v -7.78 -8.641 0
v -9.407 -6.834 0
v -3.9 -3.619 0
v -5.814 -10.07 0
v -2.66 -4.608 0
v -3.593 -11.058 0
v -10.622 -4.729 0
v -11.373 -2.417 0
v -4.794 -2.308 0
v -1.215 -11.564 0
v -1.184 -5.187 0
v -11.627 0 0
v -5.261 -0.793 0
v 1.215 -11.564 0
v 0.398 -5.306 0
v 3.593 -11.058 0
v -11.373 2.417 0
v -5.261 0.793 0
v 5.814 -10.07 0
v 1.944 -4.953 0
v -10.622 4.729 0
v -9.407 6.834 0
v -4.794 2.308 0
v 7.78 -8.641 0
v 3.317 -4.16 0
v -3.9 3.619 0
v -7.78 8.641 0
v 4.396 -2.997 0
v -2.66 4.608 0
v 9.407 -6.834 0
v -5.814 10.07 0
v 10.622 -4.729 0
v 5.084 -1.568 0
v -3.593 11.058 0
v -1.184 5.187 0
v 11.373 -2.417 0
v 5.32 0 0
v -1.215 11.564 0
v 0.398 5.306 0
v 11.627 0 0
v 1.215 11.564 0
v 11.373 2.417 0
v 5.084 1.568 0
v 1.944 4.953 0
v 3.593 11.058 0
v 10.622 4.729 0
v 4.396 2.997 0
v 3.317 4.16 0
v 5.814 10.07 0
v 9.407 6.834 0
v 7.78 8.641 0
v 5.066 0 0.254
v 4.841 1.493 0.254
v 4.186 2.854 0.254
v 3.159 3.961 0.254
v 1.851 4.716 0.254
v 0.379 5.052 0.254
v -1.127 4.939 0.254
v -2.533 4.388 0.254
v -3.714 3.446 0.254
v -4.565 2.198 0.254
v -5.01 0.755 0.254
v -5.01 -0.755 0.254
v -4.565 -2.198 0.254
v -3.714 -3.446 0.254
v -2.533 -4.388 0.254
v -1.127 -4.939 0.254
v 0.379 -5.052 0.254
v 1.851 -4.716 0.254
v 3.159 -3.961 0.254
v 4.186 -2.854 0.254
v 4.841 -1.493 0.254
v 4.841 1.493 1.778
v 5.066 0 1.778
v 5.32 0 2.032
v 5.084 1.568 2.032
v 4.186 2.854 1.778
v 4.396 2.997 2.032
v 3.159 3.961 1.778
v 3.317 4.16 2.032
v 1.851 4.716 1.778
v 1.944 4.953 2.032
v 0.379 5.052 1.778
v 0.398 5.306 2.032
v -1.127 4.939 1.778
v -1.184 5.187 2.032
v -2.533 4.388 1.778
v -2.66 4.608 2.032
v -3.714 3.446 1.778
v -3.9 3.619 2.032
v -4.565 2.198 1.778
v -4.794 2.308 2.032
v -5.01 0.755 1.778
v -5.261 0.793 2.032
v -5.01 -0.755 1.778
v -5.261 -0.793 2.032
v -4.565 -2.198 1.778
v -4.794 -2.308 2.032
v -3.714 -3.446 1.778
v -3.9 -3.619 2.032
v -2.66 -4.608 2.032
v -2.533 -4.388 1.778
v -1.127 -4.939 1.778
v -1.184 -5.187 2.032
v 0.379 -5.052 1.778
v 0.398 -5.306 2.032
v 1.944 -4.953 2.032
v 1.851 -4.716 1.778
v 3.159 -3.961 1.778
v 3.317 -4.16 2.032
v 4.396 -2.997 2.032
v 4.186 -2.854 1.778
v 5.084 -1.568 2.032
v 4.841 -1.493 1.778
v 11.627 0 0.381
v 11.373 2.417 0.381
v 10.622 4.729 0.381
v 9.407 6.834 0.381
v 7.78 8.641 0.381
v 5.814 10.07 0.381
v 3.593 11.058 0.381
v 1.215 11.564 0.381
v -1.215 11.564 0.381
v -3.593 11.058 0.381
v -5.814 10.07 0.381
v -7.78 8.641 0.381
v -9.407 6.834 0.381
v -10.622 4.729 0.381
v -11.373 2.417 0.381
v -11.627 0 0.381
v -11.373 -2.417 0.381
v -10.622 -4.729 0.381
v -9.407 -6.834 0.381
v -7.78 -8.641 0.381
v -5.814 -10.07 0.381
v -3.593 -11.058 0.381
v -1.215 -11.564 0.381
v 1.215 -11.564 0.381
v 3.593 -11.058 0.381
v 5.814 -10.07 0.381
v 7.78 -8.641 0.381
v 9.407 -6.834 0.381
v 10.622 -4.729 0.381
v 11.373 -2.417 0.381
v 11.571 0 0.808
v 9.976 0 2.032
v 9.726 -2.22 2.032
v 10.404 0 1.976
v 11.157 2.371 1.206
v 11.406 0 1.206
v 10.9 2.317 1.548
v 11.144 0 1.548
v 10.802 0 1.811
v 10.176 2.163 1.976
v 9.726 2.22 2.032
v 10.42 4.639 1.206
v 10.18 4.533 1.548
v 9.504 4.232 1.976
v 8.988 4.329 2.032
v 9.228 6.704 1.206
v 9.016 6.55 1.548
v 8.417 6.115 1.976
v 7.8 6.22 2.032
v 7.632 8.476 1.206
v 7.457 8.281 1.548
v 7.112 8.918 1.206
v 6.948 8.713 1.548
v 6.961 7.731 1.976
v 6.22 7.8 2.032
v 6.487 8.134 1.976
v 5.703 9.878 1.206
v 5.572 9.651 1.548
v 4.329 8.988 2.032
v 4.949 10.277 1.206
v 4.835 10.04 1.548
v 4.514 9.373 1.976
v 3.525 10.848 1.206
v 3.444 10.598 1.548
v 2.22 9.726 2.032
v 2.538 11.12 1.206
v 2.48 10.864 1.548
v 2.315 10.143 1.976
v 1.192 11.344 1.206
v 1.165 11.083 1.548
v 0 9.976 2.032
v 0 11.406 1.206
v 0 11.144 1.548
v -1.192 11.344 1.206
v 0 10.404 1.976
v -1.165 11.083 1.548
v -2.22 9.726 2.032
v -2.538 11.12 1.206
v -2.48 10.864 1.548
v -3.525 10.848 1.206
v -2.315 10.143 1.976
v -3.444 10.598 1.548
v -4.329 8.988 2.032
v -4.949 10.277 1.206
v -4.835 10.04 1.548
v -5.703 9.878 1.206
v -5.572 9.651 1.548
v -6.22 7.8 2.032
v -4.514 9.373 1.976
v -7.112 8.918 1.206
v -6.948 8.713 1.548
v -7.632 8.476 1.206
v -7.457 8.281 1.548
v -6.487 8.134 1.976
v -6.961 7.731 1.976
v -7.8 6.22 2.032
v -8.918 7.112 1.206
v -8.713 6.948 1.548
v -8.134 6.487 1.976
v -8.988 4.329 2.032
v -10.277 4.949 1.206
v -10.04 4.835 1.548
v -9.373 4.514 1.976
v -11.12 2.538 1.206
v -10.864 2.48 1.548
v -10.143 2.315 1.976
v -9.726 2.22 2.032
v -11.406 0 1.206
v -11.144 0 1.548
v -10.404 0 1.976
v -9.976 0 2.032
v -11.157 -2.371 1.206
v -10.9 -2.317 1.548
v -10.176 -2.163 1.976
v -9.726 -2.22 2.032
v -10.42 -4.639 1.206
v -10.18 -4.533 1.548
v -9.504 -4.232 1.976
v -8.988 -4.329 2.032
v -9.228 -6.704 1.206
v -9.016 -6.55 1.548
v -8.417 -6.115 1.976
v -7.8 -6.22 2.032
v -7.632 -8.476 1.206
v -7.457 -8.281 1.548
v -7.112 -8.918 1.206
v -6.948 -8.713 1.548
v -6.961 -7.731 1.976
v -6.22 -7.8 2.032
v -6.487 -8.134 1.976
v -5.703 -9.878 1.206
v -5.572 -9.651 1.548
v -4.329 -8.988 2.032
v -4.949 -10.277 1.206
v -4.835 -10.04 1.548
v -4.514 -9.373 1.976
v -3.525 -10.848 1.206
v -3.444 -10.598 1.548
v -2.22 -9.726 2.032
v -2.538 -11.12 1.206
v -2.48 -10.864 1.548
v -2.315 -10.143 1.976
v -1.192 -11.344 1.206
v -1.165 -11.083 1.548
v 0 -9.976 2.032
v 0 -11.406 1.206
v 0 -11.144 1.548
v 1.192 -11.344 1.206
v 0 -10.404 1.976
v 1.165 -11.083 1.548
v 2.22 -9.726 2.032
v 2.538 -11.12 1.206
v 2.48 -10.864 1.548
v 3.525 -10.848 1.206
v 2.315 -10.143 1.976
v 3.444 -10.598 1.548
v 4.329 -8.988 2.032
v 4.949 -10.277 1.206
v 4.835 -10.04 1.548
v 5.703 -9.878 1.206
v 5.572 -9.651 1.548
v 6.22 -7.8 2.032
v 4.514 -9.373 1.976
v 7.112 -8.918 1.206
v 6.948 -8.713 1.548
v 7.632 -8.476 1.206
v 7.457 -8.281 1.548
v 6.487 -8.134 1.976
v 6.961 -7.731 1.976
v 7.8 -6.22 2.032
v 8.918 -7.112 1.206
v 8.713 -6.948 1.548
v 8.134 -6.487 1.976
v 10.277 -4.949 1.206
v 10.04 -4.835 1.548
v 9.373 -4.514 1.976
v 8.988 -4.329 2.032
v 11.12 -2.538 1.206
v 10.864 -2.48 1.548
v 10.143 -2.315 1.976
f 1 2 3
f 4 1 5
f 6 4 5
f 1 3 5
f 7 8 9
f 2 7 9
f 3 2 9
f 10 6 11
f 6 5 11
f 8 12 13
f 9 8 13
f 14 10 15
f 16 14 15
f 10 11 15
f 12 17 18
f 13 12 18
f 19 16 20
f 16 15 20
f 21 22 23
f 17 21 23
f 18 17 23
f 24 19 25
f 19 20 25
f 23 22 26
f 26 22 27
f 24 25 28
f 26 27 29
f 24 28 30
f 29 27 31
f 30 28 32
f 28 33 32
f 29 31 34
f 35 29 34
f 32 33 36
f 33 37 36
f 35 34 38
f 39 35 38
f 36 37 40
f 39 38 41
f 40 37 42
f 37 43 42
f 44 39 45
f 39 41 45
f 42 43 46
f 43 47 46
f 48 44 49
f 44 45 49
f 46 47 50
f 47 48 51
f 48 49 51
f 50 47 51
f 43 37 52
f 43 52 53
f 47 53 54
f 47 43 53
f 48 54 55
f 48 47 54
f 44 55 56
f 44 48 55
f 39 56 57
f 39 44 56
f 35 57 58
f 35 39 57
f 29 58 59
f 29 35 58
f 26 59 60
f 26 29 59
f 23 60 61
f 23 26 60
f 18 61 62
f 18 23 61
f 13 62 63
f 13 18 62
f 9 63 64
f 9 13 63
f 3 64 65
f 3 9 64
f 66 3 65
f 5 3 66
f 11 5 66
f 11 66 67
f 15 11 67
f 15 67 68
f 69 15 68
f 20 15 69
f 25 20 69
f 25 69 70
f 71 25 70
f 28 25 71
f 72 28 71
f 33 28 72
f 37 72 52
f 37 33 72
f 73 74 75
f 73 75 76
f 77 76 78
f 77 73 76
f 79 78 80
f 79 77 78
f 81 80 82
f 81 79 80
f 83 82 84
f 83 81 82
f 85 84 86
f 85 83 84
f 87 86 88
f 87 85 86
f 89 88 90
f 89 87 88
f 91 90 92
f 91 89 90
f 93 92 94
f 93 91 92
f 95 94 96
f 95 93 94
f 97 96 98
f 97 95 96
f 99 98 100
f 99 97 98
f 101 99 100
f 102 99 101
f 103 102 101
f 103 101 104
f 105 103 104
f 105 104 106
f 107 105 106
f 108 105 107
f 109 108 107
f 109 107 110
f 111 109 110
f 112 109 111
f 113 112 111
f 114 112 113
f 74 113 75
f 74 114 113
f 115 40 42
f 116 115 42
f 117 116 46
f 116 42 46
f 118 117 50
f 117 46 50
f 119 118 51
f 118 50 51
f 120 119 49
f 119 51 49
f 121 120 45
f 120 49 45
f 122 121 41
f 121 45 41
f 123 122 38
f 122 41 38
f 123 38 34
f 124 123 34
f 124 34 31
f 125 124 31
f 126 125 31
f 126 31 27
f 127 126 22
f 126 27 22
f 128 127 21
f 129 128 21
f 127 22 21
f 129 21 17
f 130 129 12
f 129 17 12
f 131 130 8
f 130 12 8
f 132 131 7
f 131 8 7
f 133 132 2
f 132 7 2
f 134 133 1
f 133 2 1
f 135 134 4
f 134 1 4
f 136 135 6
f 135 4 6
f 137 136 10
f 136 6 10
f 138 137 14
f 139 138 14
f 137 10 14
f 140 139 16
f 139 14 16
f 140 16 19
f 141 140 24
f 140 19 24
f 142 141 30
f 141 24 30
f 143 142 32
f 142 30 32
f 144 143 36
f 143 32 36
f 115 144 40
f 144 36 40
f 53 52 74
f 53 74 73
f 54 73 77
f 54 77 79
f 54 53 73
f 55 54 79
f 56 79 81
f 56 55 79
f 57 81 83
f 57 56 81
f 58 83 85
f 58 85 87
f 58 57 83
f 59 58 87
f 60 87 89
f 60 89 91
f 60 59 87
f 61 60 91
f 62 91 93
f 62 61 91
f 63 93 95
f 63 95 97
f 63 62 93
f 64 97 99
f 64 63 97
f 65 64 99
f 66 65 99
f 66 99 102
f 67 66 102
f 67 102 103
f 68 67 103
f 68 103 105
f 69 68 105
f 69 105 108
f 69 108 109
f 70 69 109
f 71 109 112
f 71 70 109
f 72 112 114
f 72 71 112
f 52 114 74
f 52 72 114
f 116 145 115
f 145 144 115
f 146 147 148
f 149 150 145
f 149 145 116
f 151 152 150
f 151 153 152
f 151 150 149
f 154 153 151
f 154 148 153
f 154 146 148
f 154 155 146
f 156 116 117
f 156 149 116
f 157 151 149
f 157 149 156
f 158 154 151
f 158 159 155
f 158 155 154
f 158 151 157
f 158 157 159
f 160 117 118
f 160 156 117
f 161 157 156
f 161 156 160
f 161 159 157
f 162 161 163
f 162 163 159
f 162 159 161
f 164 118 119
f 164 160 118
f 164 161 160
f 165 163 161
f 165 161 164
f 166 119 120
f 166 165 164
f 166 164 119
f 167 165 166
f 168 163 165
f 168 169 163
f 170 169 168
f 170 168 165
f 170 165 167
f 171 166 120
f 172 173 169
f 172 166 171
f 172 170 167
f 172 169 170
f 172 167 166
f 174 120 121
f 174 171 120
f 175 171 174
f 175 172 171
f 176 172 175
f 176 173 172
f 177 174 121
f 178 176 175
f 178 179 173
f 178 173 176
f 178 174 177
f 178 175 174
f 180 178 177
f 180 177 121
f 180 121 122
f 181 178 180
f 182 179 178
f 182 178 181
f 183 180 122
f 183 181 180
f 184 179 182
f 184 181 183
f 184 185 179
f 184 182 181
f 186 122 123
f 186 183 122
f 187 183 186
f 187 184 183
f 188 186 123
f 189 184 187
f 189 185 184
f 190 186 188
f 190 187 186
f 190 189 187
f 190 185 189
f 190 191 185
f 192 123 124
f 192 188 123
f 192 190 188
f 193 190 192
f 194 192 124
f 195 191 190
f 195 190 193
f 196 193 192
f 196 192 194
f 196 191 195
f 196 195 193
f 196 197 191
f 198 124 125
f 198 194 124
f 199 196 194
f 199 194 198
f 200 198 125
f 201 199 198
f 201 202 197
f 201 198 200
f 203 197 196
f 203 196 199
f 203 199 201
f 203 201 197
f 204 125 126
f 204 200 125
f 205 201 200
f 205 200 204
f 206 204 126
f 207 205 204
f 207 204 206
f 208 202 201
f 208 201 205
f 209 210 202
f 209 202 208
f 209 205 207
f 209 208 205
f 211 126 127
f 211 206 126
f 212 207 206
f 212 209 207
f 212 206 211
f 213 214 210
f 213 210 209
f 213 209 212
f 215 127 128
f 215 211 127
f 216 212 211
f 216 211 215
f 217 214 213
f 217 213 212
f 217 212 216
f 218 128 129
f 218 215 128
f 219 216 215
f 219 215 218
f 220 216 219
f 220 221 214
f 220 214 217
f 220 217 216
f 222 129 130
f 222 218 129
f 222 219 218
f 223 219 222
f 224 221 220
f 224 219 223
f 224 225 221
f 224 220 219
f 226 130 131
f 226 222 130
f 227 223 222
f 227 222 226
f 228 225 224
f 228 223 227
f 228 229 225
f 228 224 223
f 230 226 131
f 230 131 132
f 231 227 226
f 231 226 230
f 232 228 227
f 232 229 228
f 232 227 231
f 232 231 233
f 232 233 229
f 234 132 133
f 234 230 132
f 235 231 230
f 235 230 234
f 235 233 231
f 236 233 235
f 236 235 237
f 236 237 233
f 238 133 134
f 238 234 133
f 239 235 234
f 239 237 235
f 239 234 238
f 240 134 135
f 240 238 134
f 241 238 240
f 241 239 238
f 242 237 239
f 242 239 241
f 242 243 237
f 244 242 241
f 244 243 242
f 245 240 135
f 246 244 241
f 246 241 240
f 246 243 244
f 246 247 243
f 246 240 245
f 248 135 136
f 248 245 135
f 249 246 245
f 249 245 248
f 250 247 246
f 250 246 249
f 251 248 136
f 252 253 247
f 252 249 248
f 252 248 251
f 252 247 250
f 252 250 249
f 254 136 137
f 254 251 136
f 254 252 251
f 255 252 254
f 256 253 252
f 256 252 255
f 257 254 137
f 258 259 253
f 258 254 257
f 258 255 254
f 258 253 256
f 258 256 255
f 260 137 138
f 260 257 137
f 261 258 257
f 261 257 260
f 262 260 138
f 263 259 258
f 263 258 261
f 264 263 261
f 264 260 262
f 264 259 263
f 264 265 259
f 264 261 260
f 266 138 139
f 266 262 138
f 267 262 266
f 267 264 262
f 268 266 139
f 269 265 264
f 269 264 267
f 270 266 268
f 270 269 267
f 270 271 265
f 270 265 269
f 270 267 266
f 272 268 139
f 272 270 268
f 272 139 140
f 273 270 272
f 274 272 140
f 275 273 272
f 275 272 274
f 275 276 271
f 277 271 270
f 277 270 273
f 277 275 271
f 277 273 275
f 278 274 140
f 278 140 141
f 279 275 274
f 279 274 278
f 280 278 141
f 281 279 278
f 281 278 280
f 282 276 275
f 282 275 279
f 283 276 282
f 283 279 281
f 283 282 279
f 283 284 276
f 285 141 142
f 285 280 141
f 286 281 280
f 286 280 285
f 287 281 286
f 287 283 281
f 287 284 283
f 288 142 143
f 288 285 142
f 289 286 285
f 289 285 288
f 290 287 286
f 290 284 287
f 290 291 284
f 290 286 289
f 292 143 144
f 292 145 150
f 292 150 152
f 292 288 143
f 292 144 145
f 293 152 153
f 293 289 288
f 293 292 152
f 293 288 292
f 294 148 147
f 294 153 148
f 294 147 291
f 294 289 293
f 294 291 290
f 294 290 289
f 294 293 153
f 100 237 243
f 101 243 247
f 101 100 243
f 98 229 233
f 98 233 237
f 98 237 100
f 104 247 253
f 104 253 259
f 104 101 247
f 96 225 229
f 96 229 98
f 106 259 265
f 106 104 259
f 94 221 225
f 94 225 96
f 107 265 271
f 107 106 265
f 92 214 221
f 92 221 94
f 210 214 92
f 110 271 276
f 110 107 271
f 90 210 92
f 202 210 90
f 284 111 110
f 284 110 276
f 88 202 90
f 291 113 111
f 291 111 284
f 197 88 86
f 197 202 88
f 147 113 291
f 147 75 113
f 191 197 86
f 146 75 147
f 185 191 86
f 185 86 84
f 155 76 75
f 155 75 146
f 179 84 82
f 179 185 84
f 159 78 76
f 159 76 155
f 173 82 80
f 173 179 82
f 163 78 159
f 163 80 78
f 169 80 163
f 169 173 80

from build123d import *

# Parameters (mm, degrees)
F0_R     = 11.627364
F0_R_2   = 5.06648
F1_DEPTH = 2.032
F2_R     = 1.651
F3_SIZE  = 0.254
F4_SIZE  = 0.254


with BuildPart() as f1:
    # F0 (on Top) → F1 (new body)
    with BuildSketch(Plane.XY):
        Circle(F0_R)
        Circle(F0_R_2, mode=Mode.SUBTRACT)
    extrude(amount=F1_DEPTH)

    # F2
    f2_edges = [f1.edges().sort_by_distance(p)[0] for p in [
        (-11.627364, 0, 2.032),
    ]]
    fillet(f2_edges, radius=F2_R)

    # F3
    f3_edges = [f1.edges().sort_by_distance(p)[0] for p in [
        (-5.06648, 0, 2.032),
    ]]
    chamfer(f3_edges, length=F3_SIZE)

    # F4
    f4_edges = [f1.edges().sort_by_distance(p)[0] for p in [
        (-5.06648, 0, 0),
    ]]
    chamfer(f4_edges, length=F4_SIZE)


solid = f1.part
